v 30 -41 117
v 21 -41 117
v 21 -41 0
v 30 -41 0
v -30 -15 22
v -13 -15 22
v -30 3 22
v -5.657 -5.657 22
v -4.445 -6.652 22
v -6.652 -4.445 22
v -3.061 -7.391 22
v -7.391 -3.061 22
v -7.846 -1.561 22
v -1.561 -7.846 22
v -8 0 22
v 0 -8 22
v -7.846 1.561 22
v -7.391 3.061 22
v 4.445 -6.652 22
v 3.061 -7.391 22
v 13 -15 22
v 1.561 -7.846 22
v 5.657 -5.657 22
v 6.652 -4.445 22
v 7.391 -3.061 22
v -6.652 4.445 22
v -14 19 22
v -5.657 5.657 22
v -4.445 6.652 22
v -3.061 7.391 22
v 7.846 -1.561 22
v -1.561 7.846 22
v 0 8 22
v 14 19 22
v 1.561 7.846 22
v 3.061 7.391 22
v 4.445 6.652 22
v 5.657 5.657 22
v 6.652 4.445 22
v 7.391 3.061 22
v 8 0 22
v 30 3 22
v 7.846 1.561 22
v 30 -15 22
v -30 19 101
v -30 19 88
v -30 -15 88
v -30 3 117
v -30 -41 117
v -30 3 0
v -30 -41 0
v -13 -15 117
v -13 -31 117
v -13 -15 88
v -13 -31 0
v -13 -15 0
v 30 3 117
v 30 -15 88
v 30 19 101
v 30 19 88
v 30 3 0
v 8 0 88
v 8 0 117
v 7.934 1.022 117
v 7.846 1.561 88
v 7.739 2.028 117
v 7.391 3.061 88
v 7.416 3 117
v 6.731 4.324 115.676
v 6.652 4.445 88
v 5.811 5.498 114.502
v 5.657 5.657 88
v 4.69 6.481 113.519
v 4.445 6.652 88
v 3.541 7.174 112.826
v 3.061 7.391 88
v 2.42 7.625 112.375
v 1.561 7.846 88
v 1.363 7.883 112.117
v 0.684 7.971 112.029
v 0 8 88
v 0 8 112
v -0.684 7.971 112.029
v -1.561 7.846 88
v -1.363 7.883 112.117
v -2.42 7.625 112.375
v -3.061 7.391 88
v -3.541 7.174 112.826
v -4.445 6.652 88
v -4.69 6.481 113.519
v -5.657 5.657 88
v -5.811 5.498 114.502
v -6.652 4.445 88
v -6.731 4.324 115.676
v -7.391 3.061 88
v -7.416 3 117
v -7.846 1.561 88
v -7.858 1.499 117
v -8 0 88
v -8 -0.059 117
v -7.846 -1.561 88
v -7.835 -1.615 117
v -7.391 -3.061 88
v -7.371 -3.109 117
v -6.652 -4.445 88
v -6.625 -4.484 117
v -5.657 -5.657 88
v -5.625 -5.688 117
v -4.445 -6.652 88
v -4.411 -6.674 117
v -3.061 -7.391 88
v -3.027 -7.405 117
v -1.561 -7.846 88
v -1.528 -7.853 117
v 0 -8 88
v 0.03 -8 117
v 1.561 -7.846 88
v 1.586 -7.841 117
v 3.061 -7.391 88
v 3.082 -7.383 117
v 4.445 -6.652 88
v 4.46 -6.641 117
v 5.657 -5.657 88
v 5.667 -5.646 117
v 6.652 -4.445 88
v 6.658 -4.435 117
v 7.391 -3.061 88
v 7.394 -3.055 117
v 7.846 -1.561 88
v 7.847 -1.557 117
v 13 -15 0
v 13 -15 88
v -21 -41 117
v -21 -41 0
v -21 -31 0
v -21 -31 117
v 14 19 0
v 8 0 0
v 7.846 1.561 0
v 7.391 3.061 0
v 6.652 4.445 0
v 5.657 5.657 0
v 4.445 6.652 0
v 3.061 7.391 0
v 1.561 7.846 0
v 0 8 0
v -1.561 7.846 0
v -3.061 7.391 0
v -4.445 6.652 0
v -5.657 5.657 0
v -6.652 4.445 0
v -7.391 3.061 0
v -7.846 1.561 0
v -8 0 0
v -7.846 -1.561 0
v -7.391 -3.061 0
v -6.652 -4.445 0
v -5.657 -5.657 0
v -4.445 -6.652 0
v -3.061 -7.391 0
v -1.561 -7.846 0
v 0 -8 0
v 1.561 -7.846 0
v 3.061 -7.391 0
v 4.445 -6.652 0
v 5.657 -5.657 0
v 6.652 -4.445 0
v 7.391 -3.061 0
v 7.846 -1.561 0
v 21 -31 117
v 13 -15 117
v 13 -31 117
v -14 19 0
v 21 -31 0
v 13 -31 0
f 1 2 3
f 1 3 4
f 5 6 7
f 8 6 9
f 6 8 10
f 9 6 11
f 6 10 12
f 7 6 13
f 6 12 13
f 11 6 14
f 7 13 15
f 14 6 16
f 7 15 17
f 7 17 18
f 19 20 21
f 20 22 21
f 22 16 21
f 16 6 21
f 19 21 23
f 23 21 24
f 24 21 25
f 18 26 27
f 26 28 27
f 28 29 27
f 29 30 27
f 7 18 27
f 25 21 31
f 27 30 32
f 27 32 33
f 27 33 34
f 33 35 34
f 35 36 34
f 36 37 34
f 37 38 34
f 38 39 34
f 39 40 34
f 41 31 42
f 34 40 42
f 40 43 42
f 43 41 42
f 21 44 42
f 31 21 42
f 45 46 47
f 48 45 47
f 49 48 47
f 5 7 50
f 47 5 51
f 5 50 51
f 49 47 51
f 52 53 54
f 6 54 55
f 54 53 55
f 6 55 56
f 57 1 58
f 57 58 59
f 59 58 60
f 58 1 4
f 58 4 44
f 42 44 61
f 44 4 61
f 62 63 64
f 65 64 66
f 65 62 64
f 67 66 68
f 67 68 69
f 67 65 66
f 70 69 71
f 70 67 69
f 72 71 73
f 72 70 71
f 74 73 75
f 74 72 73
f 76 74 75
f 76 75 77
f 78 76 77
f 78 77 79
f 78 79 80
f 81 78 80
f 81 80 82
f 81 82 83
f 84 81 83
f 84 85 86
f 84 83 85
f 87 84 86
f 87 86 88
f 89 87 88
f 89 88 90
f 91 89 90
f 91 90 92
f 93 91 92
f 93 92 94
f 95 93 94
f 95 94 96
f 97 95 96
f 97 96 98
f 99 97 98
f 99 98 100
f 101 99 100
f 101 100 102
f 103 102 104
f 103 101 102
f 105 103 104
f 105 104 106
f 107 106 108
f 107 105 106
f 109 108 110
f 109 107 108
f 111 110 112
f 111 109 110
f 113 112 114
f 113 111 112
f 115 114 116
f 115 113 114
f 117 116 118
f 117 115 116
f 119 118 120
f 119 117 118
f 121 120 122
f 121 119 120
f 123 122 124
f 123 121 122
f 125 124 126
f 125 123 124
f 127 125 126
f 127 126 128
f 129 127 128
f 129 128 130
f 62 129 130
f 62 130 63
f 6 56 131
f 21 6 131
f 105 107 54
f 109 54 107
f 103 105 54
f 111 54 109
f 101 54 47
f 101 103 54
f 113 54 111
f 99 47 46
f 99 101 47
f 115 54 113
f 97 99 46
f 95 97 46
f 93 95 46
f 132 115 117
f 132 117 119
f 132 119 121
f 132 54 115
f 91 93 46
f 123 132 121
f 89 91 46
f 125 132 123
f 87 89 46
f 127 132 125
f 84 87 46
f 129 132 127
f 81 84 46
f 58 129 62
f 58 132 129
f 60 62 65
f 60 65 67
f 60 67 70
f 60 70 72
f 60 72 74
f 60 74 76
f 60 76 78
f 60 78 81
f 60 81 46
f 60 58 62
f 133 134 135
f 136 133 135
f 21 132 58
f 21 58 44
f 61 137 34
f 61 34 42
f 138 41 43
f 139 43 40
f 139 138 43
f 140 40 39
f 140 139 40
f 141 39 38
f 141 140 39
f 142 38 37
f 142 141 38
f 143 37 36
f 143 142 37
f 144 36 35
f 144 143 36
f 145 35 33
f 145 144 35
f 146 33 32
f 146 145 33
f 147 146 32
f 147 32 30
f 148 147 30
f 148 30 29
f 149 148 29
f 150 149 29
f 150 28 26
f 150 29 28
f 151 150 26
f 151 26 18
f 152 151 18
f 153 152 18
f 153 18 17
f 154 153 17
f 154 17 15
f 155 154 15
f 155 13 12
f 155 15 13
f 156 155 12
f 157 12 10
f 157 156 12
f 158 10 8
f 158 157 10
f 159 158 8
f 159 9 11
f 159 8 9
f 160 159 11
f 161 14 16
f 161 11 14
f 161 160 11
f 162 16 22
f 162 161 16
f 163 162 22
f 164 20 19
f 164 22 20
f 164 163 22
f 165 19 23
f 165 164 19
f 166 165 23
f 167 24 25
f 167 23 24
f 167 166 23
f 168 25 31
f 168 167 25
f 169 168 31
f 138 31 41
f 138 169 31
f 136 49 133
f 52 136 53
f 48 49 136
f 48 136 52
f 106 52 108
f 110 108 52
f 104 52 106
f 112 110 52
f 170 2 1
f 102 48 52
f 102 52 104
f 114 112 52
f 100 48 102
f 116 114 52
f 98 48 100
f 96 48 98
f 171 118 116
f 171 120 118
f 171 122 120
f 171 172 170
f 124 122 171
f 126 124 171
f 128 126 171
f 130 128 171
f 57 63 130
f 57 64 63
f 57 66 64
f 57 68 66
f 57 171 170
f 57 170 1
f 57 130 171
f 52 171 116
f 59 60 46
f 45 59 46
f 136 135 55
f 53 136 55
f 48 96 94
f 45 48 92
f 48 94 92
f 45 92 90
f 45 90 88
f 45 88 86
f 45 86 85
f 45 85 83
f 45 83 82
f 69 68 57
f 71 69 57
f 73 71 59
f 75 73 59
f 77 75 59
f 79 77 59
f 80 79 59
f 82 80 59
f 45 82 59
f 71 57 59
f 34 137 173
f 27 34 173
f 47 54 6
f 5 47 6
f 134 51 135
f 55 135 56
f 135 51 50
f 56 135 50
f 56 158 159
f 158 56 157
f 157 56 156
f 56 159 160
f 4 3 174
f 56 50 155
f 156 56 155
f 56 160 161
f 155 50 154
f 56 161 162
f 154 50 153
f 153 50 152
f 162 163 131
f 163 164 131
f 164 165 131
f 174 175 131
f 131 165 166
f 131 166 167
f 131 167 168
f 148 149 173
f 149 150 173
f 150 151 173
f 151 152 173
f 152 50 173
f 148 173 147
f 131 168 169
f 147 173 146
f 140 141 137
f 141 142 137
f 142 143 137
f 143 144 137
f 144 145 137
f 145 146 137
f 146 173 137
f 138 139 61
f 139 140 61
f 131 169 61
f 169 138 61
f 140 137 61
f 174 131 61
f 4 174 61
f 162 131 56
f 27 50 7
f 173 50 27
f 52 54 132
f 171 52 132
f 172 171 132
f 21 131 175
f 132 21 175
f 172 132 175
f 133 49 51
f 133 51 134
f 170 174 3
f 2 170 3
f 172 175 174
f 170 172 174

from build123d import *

# Parameters (mm, degrees)
SKETCH1_R               = 8
BOSS_EXTRUDE1_DEPTH     = 117
SKETCH2_W               = 66
SKETCH2_H               = 34
CUT_EXTRUDE1_DEPTH      = 31
CUT_EXTRUDE1_DEPTH_BACK = 31
CUT_EXTRUDE2_DEPTH      = 22


with BuildPart() as part:
    # Sketch1 → Boss-Extrude1 (new body)
    with BuildSketch(Plane.XY):
        Polygon((30, 19), (-30, 19), (-30, -41), (-21, -41), (-21, -31), (-13, -31), (-13, -15), (13, -15), (13, -31), (21, -31), (21, -41), (30, -41), align=None)
        Circle(SKETCH1_R, mode=Mode.SUBTRACT)
    extrude(amount=BOSS_EXTRUDE1_DEPTH)

    # Sketch2 → Cut-Extrude1 (cut, two sides)
    with BuildSketch(Plane(origin=(0, 0, 0), x_dir=(0, 0, -1), z_dir=(1, 0, 0))) as cut_extrude1_sk:
        Polygon((-117, 3), (-101, 19), (-117, 19), align=None)
        with Locations((-55, 2)):
            Rectangle(SKETCH2_W, SKETCH2_H)
    extrude(amount=CUT_EXTRUDE1_DEPTH, mode=Mode.SUBTRACT)
    extrude(cut_extrude1_sk.sketch, amount=-CUT_EXTRUDE1_DEPTH_BACK, mode=Mode.SUBTRACT)

    # Sketch1<3> → Cut-Extrude2 (cut)
    with BuildSketch(Plane.XY):
        Polygon((30, 3), (30, 19), (14, 19), align=None)
        Polygon((-30, 3), (-14, 19), (-30, 19), align=None)
    extrude(amount=CUT_EXTRUDE2_DEPTH, mode=Mode.SUBTRACT)


solid = part.part
